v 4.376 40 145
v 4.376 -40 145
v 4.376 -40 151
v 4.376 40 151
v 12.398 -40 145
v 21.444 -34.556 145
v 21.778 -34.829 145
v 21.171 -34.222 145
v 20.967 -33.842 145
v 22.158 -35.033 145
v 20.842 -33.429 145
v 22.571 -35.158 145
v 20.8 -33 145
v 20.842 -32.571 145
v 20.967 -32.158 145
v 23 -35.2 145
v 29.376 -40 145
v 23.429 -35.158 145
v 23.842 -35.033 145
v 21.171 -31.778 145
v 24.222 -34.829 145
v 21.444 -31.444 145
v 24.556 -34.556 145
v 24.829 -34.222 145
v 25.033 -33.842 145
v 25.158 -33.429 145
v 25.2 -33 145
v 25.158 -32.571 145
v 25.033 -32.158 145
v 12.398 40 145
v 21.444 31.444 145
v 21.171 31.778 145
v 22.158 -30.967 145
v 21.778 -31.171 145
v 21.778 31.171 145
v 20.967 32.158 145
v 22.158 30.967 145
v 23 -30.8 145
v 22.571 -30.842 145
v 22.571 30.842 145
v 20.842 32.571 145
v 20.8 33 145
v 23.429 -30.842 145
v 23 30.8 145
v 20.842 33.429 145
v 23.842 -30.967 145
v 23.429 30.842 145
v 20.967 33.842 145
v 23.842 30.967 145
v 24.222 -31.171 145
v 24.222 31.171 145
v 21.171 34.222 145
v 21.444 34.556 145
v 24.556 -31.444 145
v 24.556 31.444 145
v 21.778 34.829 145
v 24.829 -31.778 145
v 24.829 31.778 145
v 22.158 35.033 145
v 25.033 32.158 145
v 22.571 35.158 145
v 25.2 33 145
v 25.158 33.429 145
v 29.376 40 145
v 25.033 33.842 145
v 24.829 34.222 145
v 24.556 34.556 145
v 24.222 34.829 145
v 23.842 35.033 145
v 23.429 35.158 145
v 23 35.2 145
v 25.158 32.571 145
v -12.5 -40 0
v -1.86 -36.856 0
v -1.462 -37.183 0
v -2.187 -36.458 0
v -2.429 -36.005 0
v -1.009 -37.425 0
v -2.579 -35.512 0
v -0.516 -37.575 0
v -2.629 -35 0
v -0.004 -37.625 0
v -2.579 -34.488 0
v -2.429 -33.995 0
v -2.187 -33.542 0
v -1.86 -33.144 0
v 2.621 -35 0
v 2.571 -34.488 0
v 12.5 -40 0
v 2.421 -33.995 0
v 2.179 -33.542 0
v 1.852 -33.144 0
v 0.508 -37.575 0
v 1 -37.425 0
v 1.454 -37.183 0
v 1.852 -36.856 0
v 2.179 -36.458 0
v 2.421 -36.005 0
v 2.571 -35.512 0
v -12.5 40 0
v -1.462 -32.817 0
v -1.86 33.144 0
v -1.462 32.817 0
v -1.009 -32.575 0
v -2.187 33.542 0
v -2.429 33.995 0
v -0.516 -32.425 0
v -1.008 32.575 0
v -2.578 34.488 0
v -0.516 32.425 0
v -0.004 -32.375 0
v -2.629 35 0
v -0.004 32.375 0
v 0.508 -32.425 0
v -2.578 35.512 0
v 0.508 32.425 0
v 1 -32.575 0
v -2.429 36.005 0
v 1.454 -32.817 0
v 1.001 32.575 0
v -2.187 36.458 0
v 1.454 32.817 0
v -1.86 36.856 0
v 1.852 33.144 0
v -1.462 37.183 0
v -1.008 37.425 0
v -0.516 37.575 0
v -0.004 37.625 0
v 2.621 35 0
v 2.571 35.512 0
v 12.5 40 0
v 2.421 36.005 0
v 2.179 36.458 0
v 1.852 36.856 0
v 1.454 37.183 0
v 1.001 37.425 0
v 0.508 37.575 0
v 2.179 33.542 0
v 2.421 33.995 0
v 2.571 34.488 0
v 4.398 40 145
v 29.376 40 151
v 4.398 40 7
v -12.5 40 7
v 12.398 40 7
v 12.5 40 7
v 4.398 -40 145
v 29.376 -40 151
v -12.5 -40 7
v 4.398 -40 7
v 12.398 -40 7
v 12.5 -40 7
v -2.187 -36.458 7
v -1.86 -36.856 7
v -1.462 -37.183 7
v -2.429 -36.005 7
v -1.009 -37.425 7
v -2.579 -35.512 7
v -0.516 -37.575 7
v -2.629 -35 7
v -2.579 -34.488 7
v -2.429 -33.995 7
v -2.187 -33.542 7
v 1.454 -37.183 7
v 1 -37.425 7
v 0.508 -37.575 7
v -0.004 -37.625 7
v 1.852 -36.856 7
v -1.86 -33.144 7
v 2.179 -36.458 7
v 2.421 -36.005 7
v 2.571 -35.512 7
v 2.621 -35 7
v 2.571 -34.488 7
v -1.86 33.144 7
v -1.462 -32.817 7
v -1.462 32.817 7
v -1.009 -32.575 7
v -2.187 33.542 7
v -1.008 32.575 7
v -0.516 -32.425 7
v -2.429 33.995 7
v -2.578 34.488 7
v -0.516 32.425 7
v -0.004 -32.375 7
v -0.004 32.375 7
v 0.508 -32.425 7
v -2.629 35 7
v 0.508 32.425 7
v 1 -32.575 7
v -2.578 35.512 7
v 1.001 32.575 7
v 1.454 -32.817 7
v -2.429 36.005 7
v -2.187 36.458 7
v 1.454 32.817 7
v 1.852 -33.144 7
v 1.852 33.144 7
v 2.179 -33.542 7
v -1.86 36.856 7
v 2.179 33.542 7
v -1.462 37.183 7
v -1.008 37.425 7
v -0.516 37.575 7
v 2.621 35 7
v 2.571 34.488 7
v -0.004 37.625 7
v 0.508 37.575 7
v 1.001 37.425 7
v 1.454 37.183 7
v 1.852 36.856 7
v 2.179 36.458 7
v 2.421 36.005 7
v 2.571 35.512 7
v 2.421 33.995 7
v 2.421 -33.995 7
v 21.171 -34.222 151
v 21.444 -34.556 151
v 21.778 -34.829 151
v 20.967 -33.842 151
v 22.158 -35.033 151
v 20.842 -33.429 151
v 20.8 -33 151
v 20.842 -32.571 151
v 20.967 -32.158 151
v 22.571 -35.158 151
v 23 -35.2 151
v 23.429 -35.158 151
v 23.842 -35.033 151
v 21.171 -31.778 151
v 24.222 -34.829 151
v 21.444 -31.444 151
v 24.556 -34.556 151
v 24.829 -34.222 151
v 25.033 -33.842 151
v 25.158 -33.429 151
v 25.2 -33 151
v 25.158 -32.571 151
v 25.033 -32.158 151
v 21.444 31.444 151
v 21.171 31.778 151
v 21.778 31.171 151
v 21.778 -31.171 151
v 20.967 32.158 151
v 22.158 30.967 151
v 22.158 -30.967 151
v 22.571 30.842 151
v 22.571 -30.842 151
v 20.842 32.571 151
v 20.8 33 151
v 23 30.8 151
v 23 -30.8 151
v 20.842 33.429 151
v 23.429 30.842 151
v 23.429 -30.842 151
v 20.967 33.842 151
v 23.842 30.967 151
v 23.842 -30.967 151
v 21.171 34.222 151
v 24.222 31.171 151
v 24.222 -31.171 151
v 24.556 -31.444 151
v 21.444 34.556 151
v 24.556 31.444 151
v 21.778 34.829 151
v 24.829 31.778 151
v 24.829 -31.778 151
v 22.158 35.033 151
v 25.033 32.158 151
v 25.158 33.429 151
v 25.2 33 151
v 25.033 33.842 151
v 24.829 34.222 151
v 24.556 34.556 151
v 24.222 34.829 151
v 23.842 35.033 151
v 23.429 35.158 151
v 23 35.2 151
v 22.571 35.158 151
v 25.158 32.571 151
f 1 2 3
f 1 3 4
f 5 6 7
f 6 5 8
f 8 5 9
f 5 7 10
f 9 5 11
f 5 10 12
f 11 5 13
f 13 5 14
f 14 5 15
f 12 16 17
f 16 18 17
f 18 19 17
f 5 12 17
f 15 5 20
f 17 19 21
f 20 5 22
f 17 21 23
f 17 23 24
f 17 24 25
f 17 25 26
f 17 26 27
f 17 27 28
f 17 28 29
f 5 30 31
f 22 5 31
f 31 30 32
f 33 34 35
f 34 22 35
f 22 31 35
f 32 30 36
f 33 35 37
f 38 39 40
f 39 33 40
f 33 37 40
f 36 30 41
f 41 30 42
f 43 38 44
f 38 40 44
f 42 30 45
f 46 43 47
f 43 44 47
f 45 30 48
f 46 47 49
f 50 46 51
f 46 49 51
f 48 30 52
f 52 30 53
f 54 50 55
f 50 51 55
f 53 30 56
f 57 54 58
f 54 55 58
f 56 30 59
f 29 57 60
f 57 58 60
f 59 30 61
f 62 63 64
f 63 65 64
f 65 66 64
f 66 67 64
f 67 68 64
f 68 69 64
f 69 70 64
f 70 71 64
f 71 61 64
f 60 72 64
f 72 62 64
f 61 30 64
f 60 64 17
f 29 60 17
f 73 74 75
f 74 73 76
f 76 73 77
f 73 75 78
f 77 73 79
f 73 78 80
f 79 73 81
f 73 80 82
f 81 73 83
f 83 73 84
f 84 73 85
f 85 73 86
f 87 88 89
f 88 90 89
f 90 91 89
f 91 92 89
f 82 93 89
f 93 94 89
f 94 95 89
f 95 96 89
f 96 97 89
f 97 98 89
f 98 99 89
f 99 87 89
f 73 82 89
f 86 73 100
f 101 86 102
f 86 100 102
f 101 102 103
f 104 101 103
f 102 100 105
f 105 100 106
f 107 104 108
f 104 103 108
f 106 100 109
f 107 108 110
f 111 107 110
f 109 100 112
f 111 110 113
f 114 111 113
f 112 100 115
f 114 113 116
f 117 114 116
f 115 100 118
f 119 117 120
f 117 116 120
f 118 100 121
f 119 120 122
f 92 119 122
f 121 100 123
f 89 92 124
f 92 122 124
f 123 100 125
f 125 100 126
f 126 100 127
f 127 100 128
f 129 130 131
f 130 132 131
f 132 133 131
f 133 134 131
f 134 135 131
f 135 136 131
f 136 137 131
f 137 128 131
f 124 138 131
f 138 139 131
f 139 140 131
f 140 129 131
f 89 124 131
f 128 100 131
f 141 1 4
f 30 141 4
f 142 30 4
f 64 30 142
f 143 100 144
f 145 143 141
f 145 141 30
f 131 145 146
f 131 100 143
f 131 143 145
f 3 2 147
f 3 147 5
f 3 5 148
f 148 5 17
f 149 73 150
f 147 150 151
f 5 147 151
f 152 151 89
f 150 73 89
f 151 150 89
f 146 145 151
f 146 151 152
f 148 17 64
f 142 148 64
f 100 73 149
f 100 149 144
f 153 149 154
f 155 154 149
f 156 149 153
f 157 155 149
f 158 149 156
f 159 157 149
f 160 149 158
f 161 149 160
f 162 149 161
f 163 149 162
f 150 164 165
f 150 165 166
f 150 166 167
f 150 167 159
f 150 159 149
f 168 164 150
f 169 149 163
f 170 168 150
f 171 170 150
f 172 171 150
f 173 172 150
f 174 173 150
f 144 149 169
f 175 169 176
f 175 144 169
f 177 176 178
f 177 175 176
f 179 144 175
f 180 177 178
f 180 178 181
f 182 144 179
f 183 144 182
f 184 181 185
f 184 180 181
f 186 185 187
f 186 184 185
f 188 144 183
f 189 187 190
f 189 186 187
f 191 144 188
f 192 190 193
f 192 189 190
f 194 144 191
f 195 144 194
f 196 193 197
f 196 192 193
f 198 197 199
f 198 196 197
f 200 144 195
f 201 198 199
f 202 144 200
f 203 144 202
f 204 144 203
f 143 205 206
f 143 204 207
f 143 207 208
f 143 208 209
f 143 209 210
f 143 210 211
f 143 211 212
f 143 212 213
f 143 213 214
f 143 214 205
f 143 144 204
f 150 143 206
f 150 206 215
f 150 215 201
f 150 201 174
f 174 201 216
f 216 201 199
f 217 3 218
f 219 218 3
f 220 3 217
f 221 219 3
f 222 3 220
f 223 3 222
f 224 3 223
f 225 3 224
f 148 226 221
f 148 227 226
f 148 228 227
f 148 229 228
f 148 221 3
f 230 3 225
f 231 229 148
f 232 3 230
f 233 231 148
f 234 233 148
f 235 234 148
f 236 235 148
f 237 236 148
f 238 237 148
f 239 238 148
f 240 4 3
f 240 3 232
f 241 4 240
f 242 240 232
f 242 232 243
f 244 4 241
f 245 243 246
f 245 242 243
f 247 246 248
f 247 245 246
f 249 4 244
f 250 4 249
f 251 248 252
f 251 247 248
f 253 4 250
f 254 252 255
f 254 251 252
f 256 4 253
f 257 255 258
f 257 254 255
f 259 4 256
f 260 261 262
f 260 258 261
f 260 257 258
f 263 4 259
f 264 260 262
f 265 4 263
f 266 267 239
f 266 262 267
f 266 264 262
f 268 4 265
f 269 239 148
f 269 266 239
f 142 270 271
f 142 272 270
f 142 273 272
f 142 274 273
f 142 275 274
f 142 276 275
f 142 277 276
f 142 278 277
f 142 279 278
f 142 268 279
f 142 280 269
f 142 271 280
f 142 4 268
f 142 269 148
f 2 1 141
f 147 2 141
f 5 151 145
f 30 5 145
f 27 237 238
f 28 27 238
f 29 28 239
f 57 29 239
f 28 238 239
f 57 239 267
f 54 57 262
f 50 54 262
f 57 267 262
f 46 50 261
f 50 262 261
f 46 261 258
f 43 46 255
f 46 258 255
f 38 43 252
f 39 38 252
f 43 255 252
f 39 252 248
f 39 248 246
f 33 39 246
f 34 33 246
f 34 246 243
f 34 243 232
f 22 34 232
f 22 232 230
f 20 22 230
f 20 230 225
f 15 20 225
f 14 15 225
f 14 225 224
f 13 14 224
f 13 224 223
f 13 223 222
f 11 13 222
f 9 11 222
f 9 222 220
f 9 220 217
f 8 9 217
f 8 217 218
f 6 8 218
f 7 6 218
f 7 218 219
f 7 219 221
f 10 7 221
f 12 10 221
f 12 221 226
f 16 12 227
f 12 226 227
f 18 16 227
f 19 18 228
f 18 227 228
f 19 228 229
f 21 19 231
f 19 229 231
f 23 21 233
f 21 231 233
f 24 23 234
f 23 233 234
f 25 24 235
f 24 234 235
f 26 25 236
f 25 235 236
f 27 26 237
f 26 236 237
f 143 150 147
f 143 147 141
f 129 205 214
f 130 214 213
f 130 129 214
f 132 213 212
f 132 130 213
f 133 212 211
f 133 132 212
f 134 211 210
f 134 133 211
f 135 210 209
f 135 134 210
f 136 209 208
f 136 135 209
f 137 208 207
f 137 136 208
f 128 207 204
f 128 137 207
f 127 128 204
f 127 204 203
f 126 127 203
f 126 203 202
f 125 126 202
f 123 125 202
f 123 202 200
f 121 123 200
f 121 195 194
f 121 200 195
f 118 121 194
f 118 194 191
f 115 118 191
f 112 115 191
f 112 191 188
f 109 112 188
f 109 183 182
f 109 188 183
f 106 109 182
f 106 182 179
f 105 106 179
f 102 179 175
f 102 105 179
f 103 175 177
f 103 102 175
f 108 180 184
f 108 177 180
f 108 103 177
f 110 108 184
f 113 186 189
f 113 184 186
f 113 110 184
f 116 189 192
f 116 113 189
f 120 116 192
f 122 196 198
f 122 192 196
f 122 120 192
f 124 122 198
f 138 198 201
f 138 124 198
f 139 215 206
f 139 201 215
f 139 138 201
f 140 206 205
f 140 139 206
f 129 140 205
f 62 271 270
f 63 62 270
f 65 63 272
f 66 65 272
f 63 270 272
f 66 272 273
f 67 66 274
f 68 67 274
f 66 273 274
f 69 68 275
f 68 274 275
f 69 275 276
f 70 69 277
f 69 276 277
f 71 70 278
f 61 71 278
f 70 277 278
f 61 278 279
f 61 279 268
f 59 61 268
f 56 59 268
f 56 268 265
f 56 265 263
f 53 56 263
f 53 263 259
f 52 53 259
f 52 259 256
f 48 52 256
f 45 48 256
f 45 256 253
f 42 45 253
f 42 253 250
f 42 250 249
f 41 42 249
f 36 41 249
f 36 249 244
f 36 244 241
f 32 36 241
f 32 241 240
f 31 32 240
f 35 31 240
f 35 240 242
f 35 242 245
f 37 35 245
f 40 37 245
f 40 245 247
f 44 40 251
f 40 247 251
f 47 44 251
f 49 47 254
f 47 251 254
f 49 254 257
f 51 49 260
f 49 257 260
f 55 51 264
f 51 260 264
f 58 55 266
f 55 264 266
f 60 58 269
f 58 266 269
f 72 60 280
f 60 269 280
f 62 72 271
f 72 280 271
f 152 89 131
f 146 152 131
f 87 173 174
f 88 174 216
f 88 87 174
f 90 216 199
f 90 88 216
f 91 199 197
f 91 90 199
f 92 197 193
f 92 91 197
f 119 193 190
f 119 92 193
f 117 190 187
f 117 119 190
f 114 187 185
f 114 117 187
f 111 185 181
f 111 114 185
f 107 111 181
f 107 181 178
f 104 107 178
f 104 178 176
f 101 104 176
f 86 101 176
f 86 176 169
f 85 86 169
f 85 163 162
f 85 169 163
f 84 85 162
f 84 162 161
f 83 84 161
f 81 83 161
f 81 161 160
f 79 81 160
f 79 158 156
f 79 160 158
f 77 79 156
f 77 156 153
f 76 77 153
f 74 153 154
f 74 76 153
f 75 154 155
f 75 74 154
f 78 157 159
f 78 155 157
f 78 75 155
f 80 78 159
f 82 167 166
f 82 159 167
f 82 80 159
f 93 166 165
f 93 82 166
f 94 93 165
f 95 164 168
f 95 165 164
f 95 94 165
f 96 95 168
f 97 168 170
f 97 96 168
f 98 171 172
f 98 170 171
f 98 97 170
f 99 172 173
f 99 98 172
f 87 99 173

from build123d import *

# Parameters (mm, degrees)
SKETCH_W        = 25
SKETCH_H        = 80
PAD_DEPTH       = 7
SKETCH001_R     = 2.625
POCKET_DEPTH    = 8
SKETCH002_W     = 8
SKETCH002_H     = 80
PAD001_DEPTH    = 145
SKETCH003_W     = 25
SKETCH003_H     = 80
PAD002_DEPTH    = 6
SKETCH004_R     = 2.2
POCKET001_DEPTH = 7


with BuildPart() as part:
    # Sketch → Pad (new body)
    with BuildSketch(Plane.XY):
        Rectangle(SKETCH_W, SKETCH_H)
    extrude(amount=PAD_DEPTH)

    # Sketch001 → Pocket (cut)
    with BuildSketch(Plane.XY):
        with Locations((-0.003934, 35)):
            Circle(SKETCH001_R)
        with Locations((-0.004048, -35)):
            Circle(SKETCH001_R)
    extrude(amount=POCKET_DEPTH, mode=Mode.SUBTRACT)

    # Sketch002 → Pad001 (join)
    with BuildSketch(Plane.XY):
        with Locations((8.398357, 0)):
            Rectangle(SKETCH002_W, SKETCH002_H)
    extrude(amount=PAD001_DEPTH)

    # Sketch003 (on Face18 of Pad001) → Pad002 (join)
    with BuildSketch(Plane.XY.offset(145)):
        with Locations((16.875703, 0)):
            Rectangle(SKETCH003_W, SKETCH003_H)
    extrude(amount=PAD002_DEPTH)

    # Sketch004 (on Face7 of Pad002) → Pocket001 (cut)
    with BuildSketch(Plane.XY.offset(151)):
        with Locations((23, 33)):
            Circle(SKETCH004_R)
        with Locations((23, -33)):
            Circle(SKETCH004_R)
    extrude(amount=-POCKET001_DEPTH, mode=Mode.SUBTRACT)


solid = part.part
